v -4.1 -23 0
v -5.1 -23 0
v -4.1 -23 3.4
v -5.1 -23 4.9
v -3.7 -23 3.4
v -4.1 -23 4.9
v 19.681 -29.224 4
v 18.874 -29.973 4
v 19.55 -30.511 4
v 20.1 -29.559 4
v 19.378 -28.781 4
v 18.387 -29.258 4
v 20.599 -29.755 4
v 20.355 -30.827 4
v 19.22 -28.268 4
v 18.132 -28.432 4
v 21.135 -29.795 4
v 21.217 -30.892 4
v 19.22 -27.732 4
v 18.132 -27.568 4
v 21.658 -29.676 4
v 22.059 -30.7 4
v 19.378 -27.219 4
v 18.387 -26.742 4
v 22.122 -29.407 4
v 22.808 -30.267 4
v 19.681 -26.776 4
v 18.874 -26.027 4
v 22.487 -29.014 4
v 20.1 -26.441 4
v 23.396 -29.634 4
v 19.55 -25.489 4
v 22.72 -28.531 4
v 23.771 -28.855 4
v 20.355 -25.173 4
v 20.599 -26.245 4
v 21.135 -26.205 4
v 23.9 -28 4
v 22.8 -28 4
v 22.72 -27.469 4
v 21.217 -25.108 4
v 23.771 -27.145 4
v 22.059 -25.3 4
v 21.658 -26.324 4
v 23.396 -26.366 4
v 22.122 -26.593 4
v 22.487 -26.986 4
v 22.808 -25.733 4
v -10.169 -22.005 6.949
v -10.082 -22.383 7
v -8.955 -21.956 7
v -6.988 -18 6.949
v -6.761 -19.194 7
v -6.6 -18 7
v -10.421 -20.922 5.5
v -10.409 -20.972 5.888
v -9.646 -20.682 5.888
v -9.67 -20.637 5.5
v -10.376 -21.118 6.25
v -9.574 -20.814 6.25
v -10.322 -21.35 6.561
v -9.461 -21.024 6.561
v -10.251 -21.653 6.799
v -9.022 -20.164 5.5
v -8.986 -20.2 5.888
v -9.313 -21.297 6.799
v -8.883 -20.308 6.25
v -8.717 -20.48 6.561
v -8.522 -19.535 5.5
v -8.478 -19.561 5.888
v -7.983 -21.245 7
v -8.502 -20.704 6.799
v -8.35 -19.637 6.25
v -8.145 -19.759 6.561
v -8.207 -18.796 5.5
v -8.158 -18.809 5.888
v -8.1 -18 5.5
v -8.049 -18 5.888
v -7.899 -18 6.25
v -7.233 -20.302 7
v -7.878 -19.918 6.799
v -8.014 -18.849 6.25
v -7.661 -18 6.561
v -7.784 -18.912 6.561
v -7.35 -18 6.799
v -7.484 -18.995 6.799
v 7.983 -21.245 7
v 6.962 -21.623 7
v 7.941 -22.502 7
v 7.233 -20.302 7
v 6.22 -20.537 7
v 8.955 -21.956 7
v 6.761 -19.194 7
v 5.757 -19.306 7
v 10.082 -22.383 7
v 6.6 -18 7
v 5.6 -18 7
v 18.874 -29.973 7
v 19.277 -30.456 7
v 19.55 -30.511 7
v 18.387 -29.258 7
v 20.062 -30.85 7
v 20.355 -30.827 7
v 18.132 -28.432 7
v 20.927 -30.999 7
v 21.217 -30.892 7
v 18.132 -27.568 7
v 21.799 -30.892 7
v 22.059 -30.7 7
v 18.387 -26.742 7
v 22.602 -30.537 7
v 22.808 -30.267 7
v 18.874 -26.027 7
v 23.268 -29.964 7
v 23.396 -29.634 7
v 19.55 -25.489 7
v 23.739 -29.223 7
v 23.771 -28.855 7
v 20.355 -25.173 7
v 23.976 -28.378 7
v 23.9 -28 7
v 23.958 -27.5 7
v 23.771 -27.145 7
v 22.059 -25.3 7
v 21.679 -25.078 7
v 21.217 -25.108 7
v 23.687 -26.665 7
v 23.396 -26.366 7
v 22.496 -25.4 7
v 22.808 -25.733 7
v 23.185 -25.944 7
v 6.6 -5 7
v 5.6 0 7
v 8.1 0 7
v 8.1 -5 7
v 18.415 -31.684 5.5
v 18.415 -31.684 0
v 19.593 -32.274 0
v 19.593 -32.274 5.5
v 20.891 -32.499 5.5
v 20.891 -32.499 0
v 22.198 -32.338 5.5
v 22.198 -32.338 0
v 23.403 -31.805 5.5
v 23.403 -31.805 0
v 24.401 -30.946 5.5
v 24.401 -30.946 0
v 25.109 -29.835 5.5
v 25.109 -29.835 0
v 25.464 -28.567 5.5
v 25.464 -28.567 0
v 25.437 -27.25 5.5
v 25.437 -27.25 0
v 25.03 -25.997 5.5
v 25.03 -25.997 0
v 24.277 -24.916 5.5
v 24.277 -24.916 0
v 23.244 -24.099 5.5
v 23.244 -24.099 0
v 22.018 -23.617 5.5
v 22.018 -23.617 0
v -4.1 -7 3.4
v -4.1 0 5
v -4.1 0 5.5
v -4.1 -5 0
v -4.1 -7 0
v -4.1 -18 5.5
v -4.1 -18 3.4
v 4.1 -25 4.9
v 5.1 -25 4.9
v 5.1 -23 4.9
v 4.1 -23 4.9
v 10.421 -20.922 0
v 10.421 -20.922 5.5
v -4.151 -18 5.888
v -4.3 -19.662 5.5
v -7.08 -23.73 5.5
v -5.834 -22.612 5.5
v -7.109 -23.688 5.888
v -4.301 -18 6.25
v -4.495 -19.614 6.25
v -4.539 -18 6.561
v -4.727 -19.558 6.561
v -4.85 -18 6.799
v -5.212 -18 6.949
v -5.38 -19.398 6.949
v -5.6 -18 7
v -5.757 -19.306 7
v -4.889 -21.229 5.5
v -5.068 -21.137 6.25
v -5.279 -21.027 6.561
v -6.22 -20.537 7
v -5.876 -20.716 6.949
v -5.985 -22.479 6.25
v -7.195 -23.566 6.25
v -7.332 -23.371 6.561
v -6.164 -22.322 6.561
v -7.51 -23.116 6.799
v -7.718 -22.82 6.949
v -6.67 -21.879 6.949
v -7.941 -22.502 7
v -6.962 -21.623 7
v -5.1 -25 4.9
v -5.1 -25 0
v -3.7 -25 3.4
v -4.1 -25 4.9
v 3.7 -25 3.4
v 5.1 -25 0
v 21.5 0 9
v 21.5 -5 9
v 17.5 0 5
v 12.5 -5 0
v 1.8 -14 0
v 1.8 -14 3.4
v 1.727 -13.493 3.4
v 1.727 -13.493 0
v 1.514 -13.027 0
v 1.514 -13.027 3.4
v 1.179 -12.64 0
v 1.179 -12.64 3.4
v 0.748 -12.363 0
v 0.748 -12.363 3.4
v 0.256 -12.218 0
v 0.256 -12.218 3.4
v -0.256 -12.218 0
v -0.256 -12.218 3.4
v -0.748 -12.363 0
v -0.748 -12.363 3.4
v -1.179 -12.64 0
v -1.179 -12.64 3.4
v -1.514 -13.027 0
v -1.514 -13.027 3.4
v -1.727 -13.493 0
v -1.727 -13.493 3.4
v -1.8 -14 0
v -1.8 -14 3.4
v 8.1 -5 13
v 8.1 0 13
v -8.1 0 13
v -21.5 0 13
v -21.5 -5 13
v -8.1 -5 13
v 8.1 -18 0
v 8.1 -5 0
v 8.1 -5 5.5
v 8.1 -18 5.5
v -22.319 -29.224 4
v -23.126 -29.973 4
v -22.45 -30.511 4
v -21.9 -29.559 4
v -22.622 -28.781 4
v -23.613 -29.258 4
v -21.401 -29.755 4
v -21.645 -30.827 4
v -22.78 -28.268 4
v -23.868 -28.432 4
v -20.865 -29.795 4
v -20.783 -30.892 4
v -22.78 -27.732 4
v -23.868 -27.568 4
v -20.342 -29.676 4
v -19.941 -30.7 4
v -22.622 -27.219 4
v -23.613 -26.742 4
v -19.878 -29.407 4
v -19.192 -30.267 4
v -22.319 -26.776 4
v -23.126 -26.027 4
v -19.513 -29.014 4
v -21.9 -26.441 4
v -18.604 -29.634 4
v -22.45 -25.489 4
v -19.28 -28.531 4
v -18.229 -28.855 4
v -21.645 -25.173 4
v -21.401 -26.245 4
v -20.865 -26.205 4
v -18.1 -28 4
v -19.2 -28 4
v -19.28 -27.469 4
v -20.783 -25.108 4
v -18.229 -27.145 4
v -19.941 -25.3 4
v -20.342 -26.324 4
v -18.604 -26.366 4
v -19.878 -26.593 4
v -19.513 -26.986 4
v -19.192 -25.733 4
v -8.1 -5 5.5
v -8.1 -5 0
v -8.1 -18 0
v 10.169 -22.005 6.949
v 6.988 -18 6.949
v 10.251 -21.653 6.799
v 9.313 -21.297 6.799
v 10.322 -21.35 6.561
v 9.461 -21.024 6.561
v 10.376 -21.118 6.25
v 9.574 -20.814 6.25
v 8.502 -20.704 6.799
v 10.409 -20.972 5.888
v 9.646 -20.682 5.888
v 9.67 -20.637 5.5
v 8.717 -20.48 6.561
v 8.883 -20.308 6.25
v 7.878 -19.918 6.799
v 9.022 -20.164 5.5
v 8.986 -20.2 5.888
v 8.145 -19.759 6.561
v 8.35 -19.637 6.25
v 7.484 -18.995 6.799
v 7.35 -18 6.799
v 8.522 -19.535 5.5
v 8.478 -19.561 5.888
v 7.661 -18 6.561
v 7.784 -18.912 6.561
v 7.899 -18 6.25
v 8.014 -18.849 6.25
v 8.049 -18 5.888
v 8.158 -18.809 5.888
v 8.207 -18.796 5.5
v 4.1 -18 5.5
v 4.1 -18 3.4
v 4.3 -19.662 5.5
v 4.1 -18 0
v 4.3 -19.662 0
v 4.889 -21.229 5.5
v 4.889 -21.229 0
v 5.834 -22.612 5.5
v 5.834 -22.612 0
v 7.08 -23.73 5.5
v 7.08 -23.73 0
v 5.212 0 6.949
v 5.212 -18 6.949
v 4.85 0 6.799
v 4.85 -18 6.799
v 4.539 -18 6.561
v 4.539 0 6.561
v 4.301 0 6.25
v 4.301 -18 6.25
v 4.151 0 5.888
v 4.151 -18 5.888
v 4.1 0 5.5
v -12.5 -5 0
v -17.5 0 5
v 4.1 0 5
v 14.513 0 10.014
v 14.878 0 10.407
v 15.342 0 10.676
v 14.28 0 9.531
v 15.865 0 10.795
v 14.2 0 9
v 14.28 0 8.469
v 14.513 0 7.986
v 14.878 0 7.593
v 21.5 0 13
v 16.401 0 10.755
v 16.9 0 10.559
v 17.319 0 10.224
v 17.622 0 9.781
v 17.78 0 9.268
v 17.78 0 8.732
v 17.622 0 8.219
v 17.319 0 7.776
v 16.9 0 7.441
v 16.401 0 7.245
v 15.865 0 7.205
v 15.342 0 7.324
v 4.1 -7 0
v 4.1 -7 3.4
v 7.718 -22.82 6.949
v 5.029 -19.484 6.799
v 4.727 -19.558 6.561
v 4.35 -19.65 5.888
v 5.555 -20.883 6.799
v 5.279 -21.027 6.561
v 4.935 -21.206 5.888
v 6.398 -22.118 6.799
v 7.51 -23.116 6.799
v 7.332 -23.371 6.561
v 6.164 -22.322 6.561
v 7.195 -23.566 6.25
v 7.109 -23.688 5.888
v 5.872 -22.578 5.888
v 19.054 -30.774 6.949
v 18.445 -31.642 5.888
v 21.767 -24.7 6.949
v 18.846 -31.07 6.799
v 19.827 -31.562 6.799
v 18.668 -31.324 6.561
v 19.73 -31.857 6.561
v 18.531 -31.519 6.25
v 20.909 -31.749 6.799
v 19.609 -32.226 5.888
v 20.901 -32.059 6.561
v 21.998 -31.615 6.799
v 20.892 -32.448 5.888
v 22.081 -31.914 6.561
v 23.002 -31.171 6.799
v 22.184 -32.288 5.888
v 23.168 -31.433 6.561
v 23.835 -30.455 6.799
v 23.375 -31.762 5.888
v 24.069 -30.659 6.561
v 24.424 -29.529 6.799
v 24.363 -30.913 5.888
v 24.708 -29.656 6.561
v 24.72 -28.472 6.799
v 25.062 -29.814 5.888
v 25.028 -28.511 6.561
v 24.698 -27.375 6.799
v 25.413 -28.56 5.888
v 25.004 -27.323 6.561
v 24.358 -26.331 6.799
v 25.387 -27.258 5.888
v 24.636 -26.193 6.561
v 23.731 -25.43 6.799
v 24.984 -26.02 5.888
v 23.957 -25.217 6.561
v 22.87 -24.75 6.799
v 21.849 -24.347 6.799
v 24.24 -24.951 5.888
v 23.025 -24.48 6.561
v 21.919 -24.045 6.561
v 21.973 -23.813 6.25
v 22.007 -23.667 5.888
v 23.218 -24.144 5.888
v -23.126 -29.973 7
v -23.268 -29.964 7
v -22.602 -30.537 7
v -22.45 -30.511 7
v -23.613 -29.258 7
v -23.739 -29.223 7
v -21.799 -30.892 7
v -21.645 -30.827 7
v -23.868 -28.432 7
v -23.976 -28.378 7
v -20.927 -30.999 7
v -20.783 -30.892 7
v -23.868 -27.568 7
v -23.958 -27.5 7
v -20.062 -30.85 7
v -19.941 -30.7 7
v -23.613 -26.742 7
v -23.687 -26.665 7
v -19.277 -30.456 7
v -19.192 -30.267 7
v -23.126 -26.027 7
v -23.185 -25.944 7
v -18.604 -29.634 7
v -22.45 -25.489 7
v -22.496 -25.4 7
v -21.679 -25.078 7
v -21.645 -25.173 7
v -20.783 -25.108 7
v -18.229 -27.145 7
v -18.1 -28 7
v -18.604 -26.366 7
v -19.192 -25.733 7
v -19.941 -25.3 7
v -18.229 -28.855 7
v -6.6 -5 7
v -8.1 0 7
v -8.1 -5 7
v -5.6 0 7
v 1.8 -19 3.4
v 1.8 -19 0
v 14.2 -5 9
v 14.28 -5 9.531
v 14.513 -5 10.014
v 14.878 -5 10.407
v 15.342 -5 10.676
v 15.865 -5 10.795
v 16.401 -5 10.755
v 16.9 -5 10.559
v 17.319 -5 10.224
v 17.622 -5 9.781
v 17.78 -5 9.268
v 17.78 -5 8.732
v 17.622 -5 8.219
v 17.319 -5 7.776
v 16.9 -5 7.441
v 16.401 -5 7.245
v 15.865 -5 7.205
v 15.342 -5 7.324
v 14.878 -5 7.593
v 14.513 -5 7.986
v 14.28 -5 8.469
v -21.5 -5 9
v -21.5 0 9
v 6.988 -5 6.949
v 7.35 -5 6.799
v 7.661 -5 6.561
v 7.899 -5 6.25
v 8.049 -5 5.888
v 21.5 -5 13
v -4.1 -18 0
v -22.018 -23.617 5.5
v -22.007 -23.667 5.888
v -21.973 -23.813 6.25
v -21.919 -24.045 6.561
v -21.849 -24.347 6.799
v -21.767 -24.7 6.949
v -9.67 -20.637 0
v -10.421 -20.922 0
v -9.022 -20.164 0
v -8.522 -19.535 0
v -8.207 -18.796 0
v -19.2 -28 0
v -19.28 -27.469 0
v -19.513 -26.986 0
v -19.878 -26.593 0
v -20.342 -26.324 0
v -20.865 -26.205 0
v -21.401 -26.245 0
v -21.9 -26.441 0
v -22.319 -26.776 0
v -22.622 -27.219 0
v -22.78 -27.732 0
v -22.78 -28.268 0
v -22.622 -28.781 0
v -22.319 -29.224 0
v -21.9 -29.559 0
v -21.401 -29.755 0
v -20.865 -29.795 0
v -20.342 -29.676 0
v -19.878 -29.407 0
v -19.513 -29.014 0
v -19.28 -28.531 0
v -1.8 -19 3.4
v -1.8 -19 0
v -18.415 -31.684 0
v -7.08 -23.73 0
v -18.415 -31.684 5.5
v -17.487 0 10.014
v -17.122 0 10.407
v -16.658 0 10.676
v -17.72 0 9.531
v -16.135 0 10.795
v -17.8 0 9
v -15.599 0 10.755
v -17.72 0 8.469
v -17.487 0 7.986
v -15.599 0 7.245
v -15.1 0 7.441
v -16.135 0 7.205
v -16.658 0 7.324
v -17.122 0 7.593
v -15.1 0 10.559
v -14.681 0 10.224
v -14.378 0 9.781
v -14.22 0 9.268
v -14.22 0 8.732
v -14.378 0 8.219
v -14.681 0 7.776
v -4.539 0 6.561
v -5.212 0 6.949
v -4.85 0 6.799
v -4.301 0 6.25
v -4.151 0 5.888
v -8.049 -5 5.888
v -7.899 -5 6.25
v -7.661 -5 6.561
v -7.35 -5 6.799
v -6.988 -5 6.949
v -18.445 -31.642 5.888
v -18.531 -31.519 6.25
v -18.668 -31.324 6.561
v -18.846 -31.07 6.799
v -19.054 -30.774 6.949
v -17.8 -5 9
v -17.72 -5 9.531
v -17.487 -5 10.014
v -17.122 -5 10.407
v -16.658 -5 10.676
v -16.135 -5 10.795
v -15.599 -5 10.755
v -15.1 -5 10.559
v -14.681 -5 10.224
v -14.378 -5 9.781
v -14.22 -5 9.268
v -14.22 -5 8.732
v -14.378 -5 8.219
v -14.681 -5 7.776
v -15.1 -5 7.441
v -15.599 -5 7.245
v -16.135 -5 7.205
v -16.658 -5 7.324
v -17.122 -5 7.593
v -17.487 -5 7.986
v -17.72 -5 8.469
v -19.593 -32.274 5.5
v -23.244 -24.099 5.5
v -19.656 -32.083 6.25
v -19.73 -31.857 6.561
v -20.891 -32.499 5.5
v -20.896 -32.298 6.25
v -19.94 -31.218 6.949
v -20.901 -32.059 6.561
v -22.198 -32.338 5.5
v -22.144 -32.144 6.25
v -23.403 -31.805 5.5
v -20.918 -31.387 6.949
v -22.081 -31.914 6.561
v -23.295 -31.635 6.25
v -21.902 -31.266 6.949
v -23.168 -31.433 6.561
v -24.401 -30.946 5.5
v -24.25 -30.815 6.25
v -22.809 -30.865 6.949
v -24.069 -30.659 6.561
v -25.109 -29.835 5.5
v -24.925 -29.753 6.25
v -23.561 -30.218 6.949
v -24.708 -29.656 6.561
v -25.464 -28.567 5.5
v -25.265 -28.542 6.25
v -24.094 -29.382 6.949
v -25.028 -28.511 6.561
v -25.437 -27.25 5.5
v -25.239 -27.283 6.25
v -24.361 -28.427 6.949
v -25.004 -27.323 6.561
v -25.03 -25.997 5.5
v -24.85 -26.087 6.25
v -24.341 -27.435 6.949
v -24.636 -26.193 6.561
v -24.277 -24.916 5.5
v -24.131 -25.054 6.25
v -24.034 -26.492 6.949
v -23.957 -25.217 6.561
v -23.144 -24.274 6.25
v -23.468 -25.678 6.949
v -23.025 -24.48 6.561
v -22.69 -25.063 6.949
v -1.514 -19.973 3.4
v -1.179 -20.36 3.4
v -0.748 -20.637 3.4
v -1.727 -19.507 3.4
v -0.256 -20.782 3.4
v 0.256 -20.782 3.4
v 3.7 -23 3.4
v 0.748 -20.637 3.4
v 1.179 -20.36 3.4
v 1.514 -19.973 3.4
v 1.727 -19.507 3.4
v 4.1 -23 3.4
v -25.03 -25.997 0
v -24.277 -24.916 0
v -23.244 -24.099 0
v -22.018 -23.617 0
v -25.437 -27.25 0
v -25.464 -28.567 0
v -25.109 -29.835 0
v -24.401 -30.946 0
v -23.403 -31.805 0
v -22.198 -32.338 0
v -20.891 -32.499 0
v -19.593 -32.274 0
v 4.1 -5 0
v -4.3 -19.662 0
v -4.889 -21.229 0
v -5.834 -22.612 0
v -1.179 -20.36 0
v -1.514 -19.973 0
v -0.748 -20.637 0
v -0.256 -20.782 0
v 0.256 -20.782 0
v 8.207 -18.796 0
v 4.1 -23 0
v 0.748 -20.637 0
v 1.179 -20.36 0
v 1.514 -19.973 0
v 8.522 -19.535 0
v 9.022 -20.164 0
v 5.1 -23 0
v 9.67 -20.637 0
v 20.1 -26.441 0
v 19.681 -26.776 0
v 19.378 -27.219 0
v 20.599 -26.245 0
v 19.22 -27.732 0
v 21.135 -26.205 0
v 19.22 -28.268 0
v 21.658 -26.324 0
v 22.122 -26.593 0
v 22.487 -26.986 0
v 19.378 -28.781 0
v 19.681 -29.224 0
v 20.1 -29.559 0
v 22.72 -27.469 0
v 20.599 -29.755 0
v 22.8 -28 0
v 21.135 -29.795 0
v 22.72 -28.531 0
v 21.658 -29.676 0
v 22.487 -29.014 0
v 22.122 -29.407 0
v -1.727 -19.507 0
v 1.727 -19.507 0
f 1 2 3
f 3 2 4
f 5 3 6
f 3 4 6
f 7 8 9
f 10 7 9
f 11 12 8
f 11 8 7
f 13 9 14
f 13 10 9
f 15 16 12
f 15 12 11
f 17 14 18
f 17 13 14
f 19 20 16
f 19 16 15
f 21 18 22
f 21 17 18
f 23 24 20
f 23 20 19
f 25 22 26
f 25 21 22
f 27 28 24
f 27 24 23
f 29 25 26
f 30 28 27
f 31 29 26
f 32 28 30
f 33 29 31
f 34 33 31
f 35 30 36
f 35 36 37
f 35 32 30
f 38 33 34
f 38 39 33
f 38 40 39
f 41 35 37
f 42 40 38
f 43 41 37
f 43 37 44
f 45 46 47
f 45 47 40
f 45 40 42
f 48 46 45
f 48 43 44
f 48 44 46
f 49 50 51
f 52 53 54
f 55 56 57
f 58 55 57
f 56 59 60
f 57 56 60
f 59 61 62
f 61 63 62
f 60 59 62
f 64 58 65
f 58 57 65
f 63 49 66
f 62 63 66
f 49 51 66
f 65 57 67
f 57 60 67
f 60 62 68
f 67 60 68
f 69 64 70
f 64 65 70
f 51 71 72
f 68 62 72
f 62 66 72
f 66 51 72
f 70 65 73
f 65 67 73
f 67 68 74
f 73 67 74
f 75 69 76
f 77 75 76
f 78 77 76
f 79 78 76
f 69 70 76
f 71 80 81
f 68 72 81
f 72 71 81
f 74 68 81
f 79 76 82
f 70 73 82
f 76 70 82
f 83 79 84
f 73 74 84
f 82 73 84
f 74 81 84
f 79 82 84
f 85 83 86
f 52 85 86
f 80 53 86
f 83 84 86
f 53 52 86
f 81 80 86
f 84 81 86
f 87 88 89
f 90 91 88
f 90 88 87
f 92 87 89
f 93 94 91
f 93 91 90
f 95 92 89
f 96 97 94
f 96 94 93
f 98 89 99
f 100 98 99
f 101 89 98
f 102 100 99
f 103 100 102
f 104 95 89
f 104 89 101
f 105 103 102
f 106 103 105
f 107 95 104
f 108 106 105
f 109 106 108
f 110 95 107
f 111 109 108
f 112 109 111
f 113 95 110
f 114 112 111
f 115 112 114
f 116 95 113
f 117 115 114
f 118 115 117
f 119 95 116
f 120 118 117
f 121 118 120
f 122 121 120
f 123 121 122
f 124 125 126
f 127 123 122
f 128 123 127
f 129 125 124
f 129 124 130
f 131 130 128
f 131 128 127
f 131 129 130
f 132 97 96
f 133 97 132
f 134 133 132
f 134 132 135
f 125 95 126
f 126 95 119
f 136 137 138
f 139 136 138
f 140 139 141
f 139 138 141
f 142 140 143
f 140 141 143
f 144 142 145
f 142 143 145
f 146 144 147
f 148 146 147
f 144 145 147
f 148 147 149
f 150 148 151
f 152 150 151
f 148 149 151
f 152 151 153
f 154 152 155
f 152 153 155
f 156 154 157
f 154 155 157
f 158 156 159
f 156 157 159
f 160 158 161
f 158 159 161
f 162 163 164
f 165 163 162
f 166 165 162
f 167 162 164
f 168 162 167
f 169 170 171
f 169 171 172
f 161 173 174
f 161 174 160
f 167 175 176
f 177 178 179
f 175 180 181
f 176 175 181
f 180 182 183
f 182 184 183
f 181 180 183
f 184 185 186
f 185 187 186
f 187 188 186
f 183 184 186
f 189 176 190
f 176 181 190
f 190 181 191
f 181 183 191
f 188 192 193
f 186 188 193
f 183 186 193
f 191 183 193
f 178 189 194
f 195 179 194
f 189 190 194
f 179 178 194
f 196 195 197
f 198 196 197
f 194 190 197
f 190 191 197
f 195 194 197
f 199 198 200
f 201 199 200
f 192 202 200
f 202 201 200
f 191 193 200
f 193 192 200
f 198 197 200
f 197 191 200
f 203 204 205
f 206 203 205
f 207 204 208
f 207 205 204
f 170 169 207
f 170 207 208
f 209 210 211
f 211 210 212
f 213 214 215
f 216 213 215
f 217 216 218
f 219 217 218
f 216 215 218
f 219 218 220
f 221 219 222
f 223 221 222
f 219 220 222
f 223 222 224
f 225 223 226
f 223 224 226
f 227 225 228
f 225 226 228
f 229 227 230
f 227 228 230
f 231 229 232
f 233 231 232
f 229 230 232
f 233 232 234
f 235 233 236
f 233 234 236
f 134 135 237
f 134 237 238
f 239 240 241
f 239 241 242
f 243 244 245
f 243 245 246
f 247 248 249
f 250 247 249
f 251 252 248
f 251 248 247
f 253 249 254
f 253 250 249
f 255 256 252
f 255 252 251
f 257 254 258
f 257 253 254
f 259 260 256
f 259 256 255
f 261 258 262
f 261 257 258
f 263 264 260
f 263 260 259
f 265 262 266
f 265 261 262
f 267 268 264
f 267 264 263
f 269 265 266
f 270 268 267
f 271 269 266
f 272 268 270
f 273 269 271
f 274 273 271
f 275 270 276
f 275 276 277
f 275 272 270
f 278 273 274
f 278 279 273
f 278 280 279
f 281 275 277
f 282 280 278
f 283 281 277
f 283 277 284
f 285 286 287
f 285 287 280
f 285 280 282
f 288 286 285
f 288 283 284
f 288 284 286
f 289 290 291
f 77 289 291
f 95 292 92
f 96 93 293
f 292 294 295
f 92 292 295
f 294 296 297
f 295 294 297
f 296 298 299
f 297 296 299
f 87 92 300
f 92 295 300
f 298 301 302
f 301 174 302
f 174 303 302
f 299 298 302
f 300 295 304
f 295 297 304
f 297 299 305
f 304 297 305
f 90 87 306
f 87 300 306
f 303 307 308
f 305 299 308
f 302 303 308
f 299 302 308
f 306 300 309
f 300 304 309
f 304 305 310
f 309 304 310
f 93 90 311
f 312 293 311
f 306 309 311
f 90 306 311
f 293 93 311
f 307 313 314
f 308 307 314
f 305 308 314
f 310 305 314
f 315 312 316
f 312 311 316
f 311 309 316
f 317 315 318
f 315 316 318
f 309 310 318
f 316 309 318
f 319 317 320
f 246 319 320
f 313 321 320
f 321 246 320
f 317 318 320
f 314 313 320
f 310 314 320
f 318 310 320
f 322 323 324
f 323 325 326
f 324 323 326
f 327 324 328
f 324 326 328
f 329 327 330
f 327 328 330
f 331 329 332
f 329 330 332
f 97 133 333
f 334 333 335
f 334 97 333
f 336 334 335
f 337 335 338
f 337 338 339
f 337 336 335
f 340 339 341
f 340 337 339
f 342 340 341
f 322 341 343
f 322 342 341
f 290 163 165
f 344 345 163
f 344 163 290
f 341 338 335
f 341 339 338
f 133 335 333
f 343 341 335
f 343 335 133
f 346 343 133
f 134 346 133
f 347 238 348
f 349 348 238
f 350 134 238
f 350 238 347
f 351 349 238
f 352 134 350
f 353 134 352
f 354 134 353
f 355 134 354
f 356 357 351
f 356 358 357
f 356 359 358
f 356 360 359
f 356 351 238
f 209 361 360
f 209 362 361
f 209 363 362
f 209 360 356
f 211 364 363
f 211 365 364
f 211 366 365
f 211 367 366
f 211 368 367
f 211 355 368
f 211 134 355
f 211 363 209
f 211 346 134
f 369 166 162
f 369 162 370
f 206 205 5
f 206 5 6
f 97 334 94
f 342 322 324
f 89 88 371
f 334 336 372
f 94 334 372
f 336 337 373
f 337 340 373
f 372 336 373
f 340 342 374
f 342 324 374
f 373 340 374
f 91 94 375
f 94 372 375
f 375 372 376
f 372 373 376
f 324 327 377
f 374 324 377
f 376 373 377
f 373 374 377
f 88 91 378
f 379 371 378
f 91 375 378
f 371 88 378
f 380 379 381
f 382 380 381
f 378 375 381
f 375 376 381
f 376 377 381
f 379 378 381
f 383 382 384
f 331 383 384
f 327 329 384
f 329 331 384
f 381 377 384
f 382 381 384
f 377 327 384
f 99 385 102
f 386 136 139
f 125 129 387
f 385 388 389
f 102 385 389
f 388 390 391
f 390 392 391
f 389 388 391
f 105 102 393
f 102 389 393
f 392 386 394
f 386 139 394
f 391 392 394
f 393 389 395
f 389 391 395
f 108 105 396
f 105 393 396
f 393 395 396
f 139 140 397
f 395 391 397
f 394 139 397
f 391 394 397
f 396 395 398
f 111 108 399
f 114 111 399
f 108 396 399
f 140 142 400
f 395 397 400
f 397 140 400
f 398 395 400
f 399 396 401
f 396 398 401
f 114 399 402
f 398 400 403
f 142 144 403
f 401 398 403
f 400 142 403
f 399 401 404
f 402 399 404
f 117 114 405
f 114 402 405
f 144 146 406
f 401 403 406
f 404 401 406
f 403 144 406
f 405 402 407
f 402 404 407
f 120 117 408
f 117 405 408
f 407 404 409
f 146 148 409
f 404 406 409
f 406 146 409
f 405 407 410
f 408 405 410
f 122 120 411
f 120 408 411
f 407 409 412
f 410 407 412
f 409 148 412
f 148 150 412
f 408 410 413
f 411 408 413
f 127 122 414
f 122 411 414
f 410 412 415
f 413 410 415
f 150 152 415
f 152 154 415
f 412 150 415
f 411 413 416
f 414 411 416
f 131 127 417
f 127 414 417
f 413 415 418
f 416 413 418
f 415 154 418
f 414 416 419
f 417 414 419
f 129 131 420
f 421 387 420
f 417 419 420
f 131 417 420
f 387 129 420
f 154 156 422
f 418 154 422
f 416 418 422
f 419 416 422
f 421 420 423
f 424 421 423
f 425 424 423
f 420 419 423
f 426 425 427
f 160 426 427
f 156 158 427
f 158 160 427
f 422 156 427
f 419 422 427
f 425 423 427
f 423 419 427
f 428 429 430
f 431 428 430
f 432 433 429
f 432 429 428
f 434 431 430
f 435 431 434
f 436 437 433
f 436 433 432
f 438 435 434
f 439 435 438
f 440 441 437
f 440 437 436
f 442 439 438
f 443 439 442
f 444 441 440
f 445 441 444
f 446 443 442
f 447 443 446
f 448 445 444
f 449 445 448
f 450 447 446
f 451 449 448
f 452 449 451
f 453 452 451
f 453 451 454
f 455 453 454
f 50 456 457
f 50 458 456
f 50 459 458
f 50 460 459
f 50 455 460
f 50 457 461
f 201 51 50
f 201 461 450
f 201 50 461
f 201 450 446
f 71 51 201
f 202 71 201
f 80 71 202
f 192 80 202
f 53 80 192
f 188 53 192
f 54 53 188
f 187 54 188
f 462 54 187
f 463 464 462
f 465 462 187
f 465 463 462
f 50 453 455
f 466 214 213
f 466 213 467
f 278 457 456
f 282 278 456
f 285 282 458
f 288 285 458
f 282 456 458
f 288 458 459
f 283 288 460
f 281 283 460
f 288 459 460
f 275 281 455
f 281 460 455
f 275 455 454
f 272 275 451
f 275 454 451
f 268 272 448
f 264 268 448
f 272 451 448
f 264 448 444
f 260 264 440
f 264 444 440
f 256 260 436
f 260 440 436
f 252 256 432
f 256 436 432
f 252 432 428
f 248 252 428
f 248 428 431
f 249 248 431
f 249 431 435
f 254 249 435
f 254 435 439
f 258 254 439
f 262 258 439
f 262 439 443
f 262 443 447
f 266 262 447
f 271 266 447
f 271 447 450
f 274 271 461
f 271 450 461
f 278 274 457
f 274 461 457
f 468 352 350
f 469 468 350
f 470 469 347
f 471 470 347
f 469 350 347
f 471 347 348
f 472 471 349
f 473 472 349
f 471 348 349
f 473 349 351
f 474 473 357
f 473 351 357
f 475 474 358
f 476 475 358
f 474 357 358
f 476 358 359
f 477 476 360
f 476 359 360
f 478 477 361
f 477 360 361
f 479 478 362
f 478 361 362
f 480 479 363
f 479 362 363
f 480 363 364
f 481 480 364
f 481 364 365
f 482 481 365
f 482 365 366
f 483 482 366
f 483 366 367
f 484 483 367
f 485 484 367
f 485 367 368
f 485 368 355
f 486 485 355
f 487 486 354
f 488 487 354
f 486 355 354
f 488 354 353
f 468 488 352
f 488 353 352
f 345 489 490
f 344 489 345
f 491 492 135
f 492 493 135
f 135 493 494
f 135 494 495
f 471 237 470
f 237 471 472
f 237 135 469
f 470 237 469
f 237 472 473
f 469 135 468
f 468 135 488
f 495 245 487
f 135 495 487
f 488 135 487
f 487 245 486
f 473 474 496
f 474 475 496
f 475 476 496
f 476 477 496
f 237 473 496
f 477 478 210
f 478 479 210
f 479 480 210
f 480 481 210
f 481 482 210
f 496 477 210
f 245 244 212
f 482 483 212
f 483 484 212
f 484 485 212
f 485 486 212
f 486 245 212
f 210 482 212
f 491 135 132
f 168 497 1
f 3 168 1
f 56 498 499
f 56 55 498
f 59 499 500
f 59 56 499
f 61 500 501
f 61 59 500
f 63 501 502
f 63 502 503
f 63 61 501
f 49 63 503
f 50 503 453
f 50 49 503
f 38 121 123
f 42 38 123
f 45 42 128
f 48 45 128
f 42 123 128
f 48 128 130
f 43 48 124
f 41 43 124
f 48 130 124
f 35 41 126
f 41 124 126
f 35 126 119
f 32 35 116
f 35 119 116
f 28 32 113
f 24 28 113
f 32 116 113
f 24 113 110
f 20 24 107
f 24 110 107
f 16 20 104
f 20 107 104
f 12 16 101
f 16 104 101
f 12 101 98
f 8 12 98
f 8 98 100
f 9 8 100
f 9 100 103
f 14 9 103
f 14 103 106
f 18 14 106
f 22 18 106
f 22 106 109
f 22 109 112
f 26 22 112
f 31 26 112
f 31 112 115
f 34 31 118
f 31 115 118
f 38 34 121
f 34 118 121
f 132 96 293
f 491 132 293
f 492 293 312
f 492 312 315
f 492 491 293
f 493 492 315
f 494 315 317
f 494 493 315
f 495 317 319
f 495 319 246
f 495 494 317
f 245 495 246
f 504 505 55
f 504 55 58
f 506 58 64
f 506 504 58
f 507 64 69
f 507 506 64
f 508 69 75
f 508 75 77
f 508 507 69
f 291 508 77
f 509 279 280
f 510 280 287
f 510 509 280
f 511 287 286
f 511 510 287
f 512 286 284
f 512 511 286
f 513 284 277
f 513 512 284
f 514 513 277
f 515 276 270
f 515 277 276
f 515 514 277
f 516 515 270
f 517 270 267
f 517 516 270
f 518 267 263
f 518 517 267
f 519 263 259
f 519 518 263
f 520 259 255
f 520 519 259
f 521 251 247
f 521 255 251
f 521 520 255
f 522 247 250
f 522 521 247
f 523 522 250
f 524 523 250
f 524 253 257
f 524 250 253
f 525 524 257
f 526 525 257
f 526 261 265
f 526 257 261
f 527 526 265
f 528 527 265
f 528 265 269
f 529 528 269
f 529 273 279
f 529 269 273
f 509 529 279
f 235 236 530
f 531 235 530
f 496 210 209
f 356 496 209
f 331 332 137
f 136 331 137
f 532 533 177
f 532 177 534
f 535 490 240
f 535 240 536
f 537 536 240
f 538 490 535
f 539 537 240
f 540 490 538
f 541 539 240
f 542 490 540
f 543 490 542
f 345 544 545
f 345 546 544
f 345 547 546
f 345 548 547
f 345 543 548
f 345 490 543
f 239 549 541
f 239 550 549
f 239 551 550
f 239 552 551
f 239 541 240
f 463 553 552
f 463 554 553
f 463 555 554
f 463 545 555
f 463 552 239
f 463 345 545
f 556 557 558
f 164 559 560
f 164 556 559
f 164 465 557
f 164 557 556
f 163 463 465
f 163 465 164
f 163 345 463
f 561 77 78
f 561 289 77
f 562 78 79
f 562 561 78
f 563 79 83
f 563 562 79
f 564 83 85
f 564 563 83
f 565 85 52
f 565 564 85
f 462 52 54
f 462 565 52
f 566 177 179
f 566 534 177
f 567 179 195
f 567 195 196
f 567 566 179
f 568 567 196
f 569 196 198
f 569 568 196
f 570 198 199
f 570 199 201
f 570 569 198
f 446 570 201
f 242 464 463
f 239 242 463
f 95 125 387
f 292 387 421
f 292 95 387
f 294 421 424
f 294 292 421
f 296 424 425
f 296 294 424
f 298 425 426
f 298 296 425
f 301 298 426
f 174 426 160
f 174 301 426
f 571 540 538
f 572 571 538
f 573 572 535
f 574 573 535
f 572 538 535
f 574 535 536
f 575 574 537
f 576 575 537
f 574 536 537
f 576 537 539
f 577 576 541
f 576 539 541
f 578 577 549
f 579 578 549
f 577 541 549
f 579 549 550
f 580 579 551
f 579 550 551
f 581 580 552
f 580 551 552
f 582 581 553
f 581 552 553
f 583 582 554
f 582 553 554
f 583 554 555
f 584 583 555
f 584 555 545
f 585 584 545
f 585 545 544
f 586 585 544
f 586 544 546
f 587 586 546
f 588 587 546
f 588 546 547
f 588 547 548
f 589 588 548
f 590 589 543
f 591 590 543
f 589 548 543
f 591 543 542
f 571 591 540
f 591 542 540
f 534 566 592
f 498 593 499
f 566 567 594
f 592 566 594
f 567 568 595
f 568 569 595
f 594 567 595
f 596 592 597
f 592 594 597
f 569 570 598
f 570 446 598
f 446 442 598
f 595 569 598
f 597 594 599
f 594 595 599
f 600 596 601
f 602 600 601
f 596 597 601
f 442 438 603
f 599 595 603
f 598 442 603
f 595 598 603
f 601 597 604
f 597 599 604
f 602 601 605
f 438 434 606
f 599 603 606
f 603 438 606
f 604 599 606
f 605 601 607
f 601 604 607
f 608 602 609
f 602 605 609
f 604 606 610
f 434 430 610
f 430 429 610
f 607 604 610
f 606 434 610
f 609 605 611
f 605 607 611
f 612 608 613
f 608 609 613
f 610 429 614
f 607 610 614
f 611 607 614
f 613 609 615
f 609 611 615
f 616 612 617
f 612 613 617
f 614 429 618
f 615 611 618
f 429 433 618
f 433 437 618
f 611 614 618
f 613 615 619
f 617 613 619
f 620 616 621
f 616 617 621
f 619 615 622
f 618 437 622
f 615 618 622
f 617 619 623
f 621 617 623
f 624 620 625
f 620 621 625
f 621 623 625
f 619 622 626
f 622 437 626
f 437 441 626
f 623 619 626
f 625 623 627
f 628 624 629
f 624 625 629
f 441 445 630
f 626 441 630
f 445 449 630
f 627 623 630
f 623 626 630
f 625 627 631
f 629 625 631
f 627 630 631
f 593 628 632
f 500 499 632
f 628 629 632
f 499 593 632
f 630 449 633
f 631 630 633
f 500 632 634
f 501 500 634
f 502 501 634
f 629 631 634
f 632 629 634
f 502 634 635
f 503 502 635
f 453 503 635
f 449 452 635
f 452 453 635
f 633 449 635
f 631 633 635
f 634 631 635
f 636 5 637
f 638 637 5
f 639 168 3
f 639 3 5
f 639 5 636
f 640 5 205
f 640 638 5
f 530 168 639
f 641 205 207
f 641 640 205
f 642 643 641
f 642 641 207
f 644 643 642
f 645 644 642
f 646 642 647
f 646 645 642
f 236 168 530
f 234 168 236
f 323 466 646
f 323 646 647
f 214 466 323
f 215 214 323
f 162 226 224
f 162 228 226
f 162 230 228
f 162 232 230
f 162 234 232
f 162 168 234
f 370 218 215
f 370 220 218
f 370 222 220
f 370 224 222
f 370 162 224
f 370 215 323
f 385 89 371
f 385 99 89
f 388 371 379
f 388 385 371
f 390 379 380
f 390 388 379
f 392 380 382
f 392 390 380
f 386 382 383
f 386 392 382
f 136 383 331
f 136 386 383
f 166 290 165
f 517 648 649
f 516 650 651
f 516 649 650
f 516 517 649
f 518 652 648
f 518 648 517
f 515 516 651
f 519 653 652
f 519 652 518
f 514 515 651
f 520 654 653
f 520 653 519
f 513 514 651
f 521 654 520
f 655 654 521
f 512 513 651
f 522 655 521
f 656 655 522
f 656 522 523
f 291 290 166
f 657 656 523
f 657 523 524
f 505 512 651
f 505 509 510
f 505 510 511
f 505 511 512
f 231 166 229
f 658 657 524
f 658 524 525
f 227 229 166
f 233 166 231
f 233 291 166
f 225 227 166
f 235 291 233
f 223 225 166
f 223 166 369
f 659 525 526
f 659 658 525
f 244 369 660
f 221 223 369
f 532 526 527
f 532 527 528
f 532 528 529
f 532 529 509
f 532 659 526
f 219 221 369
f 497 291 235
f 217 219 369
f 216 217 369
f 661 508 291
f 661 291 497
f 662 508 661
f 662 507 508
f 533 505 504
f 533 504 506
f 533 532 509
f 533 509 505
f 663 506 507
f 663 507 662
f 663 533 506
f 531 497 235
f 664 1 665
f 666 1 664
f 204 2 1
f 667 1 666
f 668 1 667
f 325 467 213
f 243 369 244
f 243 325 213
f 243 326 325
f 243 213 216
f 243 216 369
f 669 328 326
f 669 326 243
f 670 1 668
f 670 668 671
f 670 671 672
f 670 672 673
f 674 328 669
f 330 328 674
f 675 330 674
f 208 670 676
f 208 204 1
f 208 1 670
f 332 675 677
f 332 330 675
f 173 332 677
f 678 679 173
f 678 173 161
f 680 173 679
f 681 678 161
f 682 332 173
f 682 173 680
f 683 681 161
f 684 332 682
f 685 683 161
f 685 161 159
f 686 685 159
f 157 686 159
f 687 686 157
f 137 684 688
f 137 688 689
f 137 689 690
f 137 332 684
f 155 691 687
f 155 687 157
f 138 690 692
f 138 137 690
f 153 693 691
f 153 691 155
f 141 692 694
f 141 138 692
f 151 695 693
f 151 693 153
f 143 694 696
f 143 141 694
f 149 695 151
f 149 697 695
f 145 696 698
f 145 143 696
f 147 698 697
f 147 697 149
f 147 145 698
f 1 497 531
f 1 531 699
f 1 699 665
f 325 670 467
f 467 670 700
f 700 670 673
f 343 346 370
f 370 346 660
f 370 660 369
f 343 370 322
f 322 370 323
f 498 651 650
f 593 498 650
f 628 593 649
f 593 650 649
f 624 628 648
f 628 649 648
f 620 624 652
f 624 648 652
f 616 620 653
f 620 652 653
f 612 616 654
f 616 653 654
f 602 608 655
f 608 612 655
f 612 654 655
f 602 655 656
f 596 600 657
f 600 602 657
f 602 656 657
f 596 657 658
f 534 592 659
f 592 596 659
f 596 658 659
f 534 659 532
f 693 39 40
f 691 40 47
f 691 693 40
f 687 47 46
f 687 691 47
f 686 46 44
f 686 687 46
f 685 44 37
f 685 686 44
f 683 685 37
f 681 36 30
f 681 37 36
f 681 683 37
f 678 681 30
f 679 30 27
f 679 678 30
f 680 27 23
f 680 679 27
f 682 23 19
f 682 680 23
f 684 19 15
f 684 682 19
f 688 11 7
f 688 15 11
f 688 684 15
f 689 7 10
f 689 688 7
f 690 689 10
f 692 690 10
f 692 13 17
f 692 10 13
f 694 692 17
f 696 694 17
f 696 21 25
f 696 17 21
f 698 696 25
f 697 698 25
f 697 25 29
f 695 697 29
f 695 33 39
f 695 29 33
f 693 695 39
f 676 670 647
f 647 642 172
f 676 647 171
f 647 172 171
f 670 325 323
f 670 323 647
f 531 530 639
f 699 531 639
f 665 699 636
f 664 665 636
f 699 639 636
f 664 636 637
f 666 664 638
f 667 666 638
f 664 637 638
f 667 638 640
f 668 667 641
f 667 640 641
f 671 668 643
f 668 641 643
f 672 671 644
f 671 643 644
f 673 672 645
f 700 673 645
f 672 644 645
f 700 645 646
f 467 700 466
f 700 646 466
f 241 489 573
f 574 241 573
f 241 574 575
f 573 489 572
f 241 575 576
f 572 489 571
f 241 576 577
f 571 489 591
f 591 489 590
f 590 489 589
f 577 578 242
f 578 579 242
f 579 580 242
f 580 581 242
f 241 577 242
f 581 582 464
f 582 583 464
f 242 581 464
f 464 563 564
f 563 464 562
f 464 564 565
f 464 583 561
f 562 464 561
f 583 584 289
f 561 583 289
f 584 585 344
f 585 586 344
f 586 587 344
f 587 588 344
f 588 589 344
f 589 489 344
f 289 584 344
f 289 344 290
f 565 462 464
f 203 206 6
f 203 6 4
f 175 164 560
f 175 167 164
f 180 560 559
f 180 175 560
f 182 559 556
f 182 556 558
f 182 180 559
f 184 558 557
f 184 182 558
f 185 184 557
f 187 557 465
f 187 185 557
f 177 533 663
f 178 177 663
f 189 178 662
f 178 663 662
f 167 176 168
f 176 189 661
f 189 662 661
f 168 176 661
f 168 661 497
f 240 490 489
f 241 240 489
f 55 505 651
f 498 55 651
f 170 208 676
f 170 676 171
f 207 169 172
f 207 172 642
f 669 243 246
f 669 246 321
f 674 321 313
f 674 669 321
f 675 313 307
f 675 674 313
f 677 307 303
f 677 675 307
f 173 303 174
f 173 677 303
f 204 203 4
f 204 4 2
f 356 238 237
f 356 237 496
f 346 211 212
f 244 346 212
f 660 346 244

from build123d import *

# Parameters (mm, degrees)
SKETCH_R        = 1.8
PAD_DEPTH       = 7
SKETCH001_R     = 2.9
POCKET_DEPTH    = 3
SKETCH002_W     = 13.4
SKETCH002_H     = 5
PAD001_DEPTH    = 6
SKETCH005_R     = 1.8
POCKET002_DEPTH = 5
SKETCH009_W     = 8.2
SKETCH009_H     = 18
POCKET006_DEPTH = 3.6
POCKET003_DEPTH = 47.001
POCKET004_DEPTH = 5
POCKET005_DEPTH = 3.401
PAD002_DEPTH    = 2
FILLET_R        = 1.5


with BuildPart() as part:
    # Sketch → Pad (new body)
    with BuildSketch(Plane.XY):
        with BuildLine():
            Line((-21.5, 0), (-21.5, -5))
            Line((-21.5, -5), (-8.1, -5))
            Line((-8.1, -5), (-8.1, -18))
            ThreePointArc((-10.421049, -20.922161), (-8.750867, -19.865898), (-8.1, -18))
            Line((-10.421049, -20.922161), (-22.018426, -23.616758))
            ThreePointArc((-22.018426, -23.616758), (-25.108802, -29.835142), (-18.415416, -31.683738))
            Line((-7.079536, -23.730259), (-18.415416, -31.683738))
            ThreePointArc((-7.079536, -23.730259), (-4.889394, -21.2293), (-4.1, -18))
            Line((-4.1, -18), (-4.1, -25))
            Line((-4.1, -25), (4.1, -25))
            Line((4.1, -18), (4.1, -25))
            ThreePointArc((4.1, -18), (4.889394, -21.2293), (7.079536, -23.730259))
            Line((7.079536, -23.730259), (18.415416, -31.683738))
            ThreePointArc((18.415416, -31.683738), (25.108802, -29.835142), (22.018426, -23.616758))
            Line((10.421049, -20.922161), (22.018426, -23.616758))
            ThreePointArc((8.1, -18), (8.750867, -19.865898), (10.421049, -20.922161))
            Line((8.1, -5), (8.1, -18))
            Line((21.5, -5), (8.1, -5))
            Line((21.5, -5), (21.5, 0))
            Line((21.5, 0), (4.1, 0))
            Line((4.1, 0), (4.1, -7))
            Line((-4.1, -7), (4.1, -7))
            Line((-4.1, 0), (-4.1, -7))
            Line((-21.5, 0), (-4.1, 0))
        make_face()
        with Locations((-21, -28)):
            Circle(SKETCH_R, mode=Mode.SUBTRACT)
        with Locations((21, -28)):
            Circle(SKETCH_R, mode=Mode.SUBTRACT)
    extrude(amount=PAD_DEPTH)

    # Sketch001 (on Face28 of Pad) → Pocket (cut)
    with BuildSketch(Plane.XY.offset(7)):
        with Locations((-21, -28)):
            Circle(SKETCH001_R)
        with Locations((21, -28)):
            Circle(SKETCH001_R)
    extrude(amount=-POCKET_DEPTH, mode=Mode.SUBTRACT)

    # Sketch002 (on Face5 of Pocket) → Pad001 (join)
    with BuildSketch(Plane.XY.offset(7)):
        with Locations((14.8, -2.5)):
            Rectangle(SKETCH002_W, SKETCH002_H)
        with Locations((-14.8, -2.5)):
            Rectangle(SKETCH002_W, SKETCH002_H)
    extrude(amount=PAD001_DEPTH)

    # Sketch005 (on Face32 of Pad001) → Pocket002 (cut)
    with BuildSketch(Plane(origin=(0, 0, 0), x_dir=(-1, 0, 0), z_dir=(0, 1, 0))):
        with Locations((-16, 9)):
            Circle(SKETCH005_R)
        with Locations((16, 9)):
            Circle(SKETCH005_R)
    extrude(amount=-POCKET002_DEPTH, mode=Mode.SUBTRACT)

    # Sketch009 (on Face31 of Pocket002) → Pocket006 (cut)
    with BuildSketch(Plane.XY.offset(7)):
        with Locations((0, -16)):
            Rectangle(SKETCH009_W, SKETCH009_H)
    extrude(amount=-POCKET006_DEPTH, mode=Mode.SUBTRACT)

    # Sketch006 (on Face2 of Pocket006) → Pocket003 (cut, through all)
    with BuildSketch(Plane(origin=(-21.5, 0, 0), x_dir=(0, -1, 0), z_dir=(-1, 0, 0))):
        Polygon((5, 0), (0, 0), (0, 5), align=None)
    extrude(amount=-POCKET003_DEPTH, mode=Mode.SUBTRACT)

    # Sketch007 (on Face25 of Pocket003) → Pocket004 (cut)
    with BuildSketch(Plane.XZ.offset(5)):
        Polygon((-21.5, 0), (-21.5, 9), (-12.5, 0), align=None)
        Polygon((21.5, 0), (21.5, 9), (12.5, 0), align=None)
    extrude(amount=-POCKET004_DEPTH, mode=Mode.SUBTRACT)

    # Sketch008 (on Face27 of Pocket004) → Pocket005 (cut, through all)
    with BuildSketch(Plane.XY.offset(3.4)):
        with BuildLine():
            ThreePointArc((1.8, -14), (0, -12.2), (-1.8, -14))
            Line((-1.8, -14), (-1.8, -19))
            ThreePointArc((-1.8, -19), (0, -20.8), (1.8, -19))
            Line((1.8, -14), (1.8, -19))
        make_face()
    extrude(amount=-POCKET005_DEPTH, mode=Mode.SUBTRACT)

    # Sketch010 (on Face17 of Pocket005) → Pad002 (join)
    with BuildSketch(Plane.XZ.offset(25)):
        Polygon((-4.1, 4.9), (-5.1, 4.9), (-5.1, 0), (-4.1, 0), (-4.1, 3.4), (-3.7, 3.4), align=None)
        Polygon((4.1, 0), (5.1, 0), (5.1, 4.9), (4.1, 4.9), (3.7, 3.4), (4.1, 3.4), align=None)
    extrude(amount=-PAD002_DEPTH)

    # Fillet
    fillet_edges = [part.edges().sort_by_distance(p)[0] for p in [
        (-12.747476, -27.706999, 7),
        (12.747476, -27.706999, 7),
    ]]
    fillet(fillet_edges, radius=FILLET_R)


solid = part.part
